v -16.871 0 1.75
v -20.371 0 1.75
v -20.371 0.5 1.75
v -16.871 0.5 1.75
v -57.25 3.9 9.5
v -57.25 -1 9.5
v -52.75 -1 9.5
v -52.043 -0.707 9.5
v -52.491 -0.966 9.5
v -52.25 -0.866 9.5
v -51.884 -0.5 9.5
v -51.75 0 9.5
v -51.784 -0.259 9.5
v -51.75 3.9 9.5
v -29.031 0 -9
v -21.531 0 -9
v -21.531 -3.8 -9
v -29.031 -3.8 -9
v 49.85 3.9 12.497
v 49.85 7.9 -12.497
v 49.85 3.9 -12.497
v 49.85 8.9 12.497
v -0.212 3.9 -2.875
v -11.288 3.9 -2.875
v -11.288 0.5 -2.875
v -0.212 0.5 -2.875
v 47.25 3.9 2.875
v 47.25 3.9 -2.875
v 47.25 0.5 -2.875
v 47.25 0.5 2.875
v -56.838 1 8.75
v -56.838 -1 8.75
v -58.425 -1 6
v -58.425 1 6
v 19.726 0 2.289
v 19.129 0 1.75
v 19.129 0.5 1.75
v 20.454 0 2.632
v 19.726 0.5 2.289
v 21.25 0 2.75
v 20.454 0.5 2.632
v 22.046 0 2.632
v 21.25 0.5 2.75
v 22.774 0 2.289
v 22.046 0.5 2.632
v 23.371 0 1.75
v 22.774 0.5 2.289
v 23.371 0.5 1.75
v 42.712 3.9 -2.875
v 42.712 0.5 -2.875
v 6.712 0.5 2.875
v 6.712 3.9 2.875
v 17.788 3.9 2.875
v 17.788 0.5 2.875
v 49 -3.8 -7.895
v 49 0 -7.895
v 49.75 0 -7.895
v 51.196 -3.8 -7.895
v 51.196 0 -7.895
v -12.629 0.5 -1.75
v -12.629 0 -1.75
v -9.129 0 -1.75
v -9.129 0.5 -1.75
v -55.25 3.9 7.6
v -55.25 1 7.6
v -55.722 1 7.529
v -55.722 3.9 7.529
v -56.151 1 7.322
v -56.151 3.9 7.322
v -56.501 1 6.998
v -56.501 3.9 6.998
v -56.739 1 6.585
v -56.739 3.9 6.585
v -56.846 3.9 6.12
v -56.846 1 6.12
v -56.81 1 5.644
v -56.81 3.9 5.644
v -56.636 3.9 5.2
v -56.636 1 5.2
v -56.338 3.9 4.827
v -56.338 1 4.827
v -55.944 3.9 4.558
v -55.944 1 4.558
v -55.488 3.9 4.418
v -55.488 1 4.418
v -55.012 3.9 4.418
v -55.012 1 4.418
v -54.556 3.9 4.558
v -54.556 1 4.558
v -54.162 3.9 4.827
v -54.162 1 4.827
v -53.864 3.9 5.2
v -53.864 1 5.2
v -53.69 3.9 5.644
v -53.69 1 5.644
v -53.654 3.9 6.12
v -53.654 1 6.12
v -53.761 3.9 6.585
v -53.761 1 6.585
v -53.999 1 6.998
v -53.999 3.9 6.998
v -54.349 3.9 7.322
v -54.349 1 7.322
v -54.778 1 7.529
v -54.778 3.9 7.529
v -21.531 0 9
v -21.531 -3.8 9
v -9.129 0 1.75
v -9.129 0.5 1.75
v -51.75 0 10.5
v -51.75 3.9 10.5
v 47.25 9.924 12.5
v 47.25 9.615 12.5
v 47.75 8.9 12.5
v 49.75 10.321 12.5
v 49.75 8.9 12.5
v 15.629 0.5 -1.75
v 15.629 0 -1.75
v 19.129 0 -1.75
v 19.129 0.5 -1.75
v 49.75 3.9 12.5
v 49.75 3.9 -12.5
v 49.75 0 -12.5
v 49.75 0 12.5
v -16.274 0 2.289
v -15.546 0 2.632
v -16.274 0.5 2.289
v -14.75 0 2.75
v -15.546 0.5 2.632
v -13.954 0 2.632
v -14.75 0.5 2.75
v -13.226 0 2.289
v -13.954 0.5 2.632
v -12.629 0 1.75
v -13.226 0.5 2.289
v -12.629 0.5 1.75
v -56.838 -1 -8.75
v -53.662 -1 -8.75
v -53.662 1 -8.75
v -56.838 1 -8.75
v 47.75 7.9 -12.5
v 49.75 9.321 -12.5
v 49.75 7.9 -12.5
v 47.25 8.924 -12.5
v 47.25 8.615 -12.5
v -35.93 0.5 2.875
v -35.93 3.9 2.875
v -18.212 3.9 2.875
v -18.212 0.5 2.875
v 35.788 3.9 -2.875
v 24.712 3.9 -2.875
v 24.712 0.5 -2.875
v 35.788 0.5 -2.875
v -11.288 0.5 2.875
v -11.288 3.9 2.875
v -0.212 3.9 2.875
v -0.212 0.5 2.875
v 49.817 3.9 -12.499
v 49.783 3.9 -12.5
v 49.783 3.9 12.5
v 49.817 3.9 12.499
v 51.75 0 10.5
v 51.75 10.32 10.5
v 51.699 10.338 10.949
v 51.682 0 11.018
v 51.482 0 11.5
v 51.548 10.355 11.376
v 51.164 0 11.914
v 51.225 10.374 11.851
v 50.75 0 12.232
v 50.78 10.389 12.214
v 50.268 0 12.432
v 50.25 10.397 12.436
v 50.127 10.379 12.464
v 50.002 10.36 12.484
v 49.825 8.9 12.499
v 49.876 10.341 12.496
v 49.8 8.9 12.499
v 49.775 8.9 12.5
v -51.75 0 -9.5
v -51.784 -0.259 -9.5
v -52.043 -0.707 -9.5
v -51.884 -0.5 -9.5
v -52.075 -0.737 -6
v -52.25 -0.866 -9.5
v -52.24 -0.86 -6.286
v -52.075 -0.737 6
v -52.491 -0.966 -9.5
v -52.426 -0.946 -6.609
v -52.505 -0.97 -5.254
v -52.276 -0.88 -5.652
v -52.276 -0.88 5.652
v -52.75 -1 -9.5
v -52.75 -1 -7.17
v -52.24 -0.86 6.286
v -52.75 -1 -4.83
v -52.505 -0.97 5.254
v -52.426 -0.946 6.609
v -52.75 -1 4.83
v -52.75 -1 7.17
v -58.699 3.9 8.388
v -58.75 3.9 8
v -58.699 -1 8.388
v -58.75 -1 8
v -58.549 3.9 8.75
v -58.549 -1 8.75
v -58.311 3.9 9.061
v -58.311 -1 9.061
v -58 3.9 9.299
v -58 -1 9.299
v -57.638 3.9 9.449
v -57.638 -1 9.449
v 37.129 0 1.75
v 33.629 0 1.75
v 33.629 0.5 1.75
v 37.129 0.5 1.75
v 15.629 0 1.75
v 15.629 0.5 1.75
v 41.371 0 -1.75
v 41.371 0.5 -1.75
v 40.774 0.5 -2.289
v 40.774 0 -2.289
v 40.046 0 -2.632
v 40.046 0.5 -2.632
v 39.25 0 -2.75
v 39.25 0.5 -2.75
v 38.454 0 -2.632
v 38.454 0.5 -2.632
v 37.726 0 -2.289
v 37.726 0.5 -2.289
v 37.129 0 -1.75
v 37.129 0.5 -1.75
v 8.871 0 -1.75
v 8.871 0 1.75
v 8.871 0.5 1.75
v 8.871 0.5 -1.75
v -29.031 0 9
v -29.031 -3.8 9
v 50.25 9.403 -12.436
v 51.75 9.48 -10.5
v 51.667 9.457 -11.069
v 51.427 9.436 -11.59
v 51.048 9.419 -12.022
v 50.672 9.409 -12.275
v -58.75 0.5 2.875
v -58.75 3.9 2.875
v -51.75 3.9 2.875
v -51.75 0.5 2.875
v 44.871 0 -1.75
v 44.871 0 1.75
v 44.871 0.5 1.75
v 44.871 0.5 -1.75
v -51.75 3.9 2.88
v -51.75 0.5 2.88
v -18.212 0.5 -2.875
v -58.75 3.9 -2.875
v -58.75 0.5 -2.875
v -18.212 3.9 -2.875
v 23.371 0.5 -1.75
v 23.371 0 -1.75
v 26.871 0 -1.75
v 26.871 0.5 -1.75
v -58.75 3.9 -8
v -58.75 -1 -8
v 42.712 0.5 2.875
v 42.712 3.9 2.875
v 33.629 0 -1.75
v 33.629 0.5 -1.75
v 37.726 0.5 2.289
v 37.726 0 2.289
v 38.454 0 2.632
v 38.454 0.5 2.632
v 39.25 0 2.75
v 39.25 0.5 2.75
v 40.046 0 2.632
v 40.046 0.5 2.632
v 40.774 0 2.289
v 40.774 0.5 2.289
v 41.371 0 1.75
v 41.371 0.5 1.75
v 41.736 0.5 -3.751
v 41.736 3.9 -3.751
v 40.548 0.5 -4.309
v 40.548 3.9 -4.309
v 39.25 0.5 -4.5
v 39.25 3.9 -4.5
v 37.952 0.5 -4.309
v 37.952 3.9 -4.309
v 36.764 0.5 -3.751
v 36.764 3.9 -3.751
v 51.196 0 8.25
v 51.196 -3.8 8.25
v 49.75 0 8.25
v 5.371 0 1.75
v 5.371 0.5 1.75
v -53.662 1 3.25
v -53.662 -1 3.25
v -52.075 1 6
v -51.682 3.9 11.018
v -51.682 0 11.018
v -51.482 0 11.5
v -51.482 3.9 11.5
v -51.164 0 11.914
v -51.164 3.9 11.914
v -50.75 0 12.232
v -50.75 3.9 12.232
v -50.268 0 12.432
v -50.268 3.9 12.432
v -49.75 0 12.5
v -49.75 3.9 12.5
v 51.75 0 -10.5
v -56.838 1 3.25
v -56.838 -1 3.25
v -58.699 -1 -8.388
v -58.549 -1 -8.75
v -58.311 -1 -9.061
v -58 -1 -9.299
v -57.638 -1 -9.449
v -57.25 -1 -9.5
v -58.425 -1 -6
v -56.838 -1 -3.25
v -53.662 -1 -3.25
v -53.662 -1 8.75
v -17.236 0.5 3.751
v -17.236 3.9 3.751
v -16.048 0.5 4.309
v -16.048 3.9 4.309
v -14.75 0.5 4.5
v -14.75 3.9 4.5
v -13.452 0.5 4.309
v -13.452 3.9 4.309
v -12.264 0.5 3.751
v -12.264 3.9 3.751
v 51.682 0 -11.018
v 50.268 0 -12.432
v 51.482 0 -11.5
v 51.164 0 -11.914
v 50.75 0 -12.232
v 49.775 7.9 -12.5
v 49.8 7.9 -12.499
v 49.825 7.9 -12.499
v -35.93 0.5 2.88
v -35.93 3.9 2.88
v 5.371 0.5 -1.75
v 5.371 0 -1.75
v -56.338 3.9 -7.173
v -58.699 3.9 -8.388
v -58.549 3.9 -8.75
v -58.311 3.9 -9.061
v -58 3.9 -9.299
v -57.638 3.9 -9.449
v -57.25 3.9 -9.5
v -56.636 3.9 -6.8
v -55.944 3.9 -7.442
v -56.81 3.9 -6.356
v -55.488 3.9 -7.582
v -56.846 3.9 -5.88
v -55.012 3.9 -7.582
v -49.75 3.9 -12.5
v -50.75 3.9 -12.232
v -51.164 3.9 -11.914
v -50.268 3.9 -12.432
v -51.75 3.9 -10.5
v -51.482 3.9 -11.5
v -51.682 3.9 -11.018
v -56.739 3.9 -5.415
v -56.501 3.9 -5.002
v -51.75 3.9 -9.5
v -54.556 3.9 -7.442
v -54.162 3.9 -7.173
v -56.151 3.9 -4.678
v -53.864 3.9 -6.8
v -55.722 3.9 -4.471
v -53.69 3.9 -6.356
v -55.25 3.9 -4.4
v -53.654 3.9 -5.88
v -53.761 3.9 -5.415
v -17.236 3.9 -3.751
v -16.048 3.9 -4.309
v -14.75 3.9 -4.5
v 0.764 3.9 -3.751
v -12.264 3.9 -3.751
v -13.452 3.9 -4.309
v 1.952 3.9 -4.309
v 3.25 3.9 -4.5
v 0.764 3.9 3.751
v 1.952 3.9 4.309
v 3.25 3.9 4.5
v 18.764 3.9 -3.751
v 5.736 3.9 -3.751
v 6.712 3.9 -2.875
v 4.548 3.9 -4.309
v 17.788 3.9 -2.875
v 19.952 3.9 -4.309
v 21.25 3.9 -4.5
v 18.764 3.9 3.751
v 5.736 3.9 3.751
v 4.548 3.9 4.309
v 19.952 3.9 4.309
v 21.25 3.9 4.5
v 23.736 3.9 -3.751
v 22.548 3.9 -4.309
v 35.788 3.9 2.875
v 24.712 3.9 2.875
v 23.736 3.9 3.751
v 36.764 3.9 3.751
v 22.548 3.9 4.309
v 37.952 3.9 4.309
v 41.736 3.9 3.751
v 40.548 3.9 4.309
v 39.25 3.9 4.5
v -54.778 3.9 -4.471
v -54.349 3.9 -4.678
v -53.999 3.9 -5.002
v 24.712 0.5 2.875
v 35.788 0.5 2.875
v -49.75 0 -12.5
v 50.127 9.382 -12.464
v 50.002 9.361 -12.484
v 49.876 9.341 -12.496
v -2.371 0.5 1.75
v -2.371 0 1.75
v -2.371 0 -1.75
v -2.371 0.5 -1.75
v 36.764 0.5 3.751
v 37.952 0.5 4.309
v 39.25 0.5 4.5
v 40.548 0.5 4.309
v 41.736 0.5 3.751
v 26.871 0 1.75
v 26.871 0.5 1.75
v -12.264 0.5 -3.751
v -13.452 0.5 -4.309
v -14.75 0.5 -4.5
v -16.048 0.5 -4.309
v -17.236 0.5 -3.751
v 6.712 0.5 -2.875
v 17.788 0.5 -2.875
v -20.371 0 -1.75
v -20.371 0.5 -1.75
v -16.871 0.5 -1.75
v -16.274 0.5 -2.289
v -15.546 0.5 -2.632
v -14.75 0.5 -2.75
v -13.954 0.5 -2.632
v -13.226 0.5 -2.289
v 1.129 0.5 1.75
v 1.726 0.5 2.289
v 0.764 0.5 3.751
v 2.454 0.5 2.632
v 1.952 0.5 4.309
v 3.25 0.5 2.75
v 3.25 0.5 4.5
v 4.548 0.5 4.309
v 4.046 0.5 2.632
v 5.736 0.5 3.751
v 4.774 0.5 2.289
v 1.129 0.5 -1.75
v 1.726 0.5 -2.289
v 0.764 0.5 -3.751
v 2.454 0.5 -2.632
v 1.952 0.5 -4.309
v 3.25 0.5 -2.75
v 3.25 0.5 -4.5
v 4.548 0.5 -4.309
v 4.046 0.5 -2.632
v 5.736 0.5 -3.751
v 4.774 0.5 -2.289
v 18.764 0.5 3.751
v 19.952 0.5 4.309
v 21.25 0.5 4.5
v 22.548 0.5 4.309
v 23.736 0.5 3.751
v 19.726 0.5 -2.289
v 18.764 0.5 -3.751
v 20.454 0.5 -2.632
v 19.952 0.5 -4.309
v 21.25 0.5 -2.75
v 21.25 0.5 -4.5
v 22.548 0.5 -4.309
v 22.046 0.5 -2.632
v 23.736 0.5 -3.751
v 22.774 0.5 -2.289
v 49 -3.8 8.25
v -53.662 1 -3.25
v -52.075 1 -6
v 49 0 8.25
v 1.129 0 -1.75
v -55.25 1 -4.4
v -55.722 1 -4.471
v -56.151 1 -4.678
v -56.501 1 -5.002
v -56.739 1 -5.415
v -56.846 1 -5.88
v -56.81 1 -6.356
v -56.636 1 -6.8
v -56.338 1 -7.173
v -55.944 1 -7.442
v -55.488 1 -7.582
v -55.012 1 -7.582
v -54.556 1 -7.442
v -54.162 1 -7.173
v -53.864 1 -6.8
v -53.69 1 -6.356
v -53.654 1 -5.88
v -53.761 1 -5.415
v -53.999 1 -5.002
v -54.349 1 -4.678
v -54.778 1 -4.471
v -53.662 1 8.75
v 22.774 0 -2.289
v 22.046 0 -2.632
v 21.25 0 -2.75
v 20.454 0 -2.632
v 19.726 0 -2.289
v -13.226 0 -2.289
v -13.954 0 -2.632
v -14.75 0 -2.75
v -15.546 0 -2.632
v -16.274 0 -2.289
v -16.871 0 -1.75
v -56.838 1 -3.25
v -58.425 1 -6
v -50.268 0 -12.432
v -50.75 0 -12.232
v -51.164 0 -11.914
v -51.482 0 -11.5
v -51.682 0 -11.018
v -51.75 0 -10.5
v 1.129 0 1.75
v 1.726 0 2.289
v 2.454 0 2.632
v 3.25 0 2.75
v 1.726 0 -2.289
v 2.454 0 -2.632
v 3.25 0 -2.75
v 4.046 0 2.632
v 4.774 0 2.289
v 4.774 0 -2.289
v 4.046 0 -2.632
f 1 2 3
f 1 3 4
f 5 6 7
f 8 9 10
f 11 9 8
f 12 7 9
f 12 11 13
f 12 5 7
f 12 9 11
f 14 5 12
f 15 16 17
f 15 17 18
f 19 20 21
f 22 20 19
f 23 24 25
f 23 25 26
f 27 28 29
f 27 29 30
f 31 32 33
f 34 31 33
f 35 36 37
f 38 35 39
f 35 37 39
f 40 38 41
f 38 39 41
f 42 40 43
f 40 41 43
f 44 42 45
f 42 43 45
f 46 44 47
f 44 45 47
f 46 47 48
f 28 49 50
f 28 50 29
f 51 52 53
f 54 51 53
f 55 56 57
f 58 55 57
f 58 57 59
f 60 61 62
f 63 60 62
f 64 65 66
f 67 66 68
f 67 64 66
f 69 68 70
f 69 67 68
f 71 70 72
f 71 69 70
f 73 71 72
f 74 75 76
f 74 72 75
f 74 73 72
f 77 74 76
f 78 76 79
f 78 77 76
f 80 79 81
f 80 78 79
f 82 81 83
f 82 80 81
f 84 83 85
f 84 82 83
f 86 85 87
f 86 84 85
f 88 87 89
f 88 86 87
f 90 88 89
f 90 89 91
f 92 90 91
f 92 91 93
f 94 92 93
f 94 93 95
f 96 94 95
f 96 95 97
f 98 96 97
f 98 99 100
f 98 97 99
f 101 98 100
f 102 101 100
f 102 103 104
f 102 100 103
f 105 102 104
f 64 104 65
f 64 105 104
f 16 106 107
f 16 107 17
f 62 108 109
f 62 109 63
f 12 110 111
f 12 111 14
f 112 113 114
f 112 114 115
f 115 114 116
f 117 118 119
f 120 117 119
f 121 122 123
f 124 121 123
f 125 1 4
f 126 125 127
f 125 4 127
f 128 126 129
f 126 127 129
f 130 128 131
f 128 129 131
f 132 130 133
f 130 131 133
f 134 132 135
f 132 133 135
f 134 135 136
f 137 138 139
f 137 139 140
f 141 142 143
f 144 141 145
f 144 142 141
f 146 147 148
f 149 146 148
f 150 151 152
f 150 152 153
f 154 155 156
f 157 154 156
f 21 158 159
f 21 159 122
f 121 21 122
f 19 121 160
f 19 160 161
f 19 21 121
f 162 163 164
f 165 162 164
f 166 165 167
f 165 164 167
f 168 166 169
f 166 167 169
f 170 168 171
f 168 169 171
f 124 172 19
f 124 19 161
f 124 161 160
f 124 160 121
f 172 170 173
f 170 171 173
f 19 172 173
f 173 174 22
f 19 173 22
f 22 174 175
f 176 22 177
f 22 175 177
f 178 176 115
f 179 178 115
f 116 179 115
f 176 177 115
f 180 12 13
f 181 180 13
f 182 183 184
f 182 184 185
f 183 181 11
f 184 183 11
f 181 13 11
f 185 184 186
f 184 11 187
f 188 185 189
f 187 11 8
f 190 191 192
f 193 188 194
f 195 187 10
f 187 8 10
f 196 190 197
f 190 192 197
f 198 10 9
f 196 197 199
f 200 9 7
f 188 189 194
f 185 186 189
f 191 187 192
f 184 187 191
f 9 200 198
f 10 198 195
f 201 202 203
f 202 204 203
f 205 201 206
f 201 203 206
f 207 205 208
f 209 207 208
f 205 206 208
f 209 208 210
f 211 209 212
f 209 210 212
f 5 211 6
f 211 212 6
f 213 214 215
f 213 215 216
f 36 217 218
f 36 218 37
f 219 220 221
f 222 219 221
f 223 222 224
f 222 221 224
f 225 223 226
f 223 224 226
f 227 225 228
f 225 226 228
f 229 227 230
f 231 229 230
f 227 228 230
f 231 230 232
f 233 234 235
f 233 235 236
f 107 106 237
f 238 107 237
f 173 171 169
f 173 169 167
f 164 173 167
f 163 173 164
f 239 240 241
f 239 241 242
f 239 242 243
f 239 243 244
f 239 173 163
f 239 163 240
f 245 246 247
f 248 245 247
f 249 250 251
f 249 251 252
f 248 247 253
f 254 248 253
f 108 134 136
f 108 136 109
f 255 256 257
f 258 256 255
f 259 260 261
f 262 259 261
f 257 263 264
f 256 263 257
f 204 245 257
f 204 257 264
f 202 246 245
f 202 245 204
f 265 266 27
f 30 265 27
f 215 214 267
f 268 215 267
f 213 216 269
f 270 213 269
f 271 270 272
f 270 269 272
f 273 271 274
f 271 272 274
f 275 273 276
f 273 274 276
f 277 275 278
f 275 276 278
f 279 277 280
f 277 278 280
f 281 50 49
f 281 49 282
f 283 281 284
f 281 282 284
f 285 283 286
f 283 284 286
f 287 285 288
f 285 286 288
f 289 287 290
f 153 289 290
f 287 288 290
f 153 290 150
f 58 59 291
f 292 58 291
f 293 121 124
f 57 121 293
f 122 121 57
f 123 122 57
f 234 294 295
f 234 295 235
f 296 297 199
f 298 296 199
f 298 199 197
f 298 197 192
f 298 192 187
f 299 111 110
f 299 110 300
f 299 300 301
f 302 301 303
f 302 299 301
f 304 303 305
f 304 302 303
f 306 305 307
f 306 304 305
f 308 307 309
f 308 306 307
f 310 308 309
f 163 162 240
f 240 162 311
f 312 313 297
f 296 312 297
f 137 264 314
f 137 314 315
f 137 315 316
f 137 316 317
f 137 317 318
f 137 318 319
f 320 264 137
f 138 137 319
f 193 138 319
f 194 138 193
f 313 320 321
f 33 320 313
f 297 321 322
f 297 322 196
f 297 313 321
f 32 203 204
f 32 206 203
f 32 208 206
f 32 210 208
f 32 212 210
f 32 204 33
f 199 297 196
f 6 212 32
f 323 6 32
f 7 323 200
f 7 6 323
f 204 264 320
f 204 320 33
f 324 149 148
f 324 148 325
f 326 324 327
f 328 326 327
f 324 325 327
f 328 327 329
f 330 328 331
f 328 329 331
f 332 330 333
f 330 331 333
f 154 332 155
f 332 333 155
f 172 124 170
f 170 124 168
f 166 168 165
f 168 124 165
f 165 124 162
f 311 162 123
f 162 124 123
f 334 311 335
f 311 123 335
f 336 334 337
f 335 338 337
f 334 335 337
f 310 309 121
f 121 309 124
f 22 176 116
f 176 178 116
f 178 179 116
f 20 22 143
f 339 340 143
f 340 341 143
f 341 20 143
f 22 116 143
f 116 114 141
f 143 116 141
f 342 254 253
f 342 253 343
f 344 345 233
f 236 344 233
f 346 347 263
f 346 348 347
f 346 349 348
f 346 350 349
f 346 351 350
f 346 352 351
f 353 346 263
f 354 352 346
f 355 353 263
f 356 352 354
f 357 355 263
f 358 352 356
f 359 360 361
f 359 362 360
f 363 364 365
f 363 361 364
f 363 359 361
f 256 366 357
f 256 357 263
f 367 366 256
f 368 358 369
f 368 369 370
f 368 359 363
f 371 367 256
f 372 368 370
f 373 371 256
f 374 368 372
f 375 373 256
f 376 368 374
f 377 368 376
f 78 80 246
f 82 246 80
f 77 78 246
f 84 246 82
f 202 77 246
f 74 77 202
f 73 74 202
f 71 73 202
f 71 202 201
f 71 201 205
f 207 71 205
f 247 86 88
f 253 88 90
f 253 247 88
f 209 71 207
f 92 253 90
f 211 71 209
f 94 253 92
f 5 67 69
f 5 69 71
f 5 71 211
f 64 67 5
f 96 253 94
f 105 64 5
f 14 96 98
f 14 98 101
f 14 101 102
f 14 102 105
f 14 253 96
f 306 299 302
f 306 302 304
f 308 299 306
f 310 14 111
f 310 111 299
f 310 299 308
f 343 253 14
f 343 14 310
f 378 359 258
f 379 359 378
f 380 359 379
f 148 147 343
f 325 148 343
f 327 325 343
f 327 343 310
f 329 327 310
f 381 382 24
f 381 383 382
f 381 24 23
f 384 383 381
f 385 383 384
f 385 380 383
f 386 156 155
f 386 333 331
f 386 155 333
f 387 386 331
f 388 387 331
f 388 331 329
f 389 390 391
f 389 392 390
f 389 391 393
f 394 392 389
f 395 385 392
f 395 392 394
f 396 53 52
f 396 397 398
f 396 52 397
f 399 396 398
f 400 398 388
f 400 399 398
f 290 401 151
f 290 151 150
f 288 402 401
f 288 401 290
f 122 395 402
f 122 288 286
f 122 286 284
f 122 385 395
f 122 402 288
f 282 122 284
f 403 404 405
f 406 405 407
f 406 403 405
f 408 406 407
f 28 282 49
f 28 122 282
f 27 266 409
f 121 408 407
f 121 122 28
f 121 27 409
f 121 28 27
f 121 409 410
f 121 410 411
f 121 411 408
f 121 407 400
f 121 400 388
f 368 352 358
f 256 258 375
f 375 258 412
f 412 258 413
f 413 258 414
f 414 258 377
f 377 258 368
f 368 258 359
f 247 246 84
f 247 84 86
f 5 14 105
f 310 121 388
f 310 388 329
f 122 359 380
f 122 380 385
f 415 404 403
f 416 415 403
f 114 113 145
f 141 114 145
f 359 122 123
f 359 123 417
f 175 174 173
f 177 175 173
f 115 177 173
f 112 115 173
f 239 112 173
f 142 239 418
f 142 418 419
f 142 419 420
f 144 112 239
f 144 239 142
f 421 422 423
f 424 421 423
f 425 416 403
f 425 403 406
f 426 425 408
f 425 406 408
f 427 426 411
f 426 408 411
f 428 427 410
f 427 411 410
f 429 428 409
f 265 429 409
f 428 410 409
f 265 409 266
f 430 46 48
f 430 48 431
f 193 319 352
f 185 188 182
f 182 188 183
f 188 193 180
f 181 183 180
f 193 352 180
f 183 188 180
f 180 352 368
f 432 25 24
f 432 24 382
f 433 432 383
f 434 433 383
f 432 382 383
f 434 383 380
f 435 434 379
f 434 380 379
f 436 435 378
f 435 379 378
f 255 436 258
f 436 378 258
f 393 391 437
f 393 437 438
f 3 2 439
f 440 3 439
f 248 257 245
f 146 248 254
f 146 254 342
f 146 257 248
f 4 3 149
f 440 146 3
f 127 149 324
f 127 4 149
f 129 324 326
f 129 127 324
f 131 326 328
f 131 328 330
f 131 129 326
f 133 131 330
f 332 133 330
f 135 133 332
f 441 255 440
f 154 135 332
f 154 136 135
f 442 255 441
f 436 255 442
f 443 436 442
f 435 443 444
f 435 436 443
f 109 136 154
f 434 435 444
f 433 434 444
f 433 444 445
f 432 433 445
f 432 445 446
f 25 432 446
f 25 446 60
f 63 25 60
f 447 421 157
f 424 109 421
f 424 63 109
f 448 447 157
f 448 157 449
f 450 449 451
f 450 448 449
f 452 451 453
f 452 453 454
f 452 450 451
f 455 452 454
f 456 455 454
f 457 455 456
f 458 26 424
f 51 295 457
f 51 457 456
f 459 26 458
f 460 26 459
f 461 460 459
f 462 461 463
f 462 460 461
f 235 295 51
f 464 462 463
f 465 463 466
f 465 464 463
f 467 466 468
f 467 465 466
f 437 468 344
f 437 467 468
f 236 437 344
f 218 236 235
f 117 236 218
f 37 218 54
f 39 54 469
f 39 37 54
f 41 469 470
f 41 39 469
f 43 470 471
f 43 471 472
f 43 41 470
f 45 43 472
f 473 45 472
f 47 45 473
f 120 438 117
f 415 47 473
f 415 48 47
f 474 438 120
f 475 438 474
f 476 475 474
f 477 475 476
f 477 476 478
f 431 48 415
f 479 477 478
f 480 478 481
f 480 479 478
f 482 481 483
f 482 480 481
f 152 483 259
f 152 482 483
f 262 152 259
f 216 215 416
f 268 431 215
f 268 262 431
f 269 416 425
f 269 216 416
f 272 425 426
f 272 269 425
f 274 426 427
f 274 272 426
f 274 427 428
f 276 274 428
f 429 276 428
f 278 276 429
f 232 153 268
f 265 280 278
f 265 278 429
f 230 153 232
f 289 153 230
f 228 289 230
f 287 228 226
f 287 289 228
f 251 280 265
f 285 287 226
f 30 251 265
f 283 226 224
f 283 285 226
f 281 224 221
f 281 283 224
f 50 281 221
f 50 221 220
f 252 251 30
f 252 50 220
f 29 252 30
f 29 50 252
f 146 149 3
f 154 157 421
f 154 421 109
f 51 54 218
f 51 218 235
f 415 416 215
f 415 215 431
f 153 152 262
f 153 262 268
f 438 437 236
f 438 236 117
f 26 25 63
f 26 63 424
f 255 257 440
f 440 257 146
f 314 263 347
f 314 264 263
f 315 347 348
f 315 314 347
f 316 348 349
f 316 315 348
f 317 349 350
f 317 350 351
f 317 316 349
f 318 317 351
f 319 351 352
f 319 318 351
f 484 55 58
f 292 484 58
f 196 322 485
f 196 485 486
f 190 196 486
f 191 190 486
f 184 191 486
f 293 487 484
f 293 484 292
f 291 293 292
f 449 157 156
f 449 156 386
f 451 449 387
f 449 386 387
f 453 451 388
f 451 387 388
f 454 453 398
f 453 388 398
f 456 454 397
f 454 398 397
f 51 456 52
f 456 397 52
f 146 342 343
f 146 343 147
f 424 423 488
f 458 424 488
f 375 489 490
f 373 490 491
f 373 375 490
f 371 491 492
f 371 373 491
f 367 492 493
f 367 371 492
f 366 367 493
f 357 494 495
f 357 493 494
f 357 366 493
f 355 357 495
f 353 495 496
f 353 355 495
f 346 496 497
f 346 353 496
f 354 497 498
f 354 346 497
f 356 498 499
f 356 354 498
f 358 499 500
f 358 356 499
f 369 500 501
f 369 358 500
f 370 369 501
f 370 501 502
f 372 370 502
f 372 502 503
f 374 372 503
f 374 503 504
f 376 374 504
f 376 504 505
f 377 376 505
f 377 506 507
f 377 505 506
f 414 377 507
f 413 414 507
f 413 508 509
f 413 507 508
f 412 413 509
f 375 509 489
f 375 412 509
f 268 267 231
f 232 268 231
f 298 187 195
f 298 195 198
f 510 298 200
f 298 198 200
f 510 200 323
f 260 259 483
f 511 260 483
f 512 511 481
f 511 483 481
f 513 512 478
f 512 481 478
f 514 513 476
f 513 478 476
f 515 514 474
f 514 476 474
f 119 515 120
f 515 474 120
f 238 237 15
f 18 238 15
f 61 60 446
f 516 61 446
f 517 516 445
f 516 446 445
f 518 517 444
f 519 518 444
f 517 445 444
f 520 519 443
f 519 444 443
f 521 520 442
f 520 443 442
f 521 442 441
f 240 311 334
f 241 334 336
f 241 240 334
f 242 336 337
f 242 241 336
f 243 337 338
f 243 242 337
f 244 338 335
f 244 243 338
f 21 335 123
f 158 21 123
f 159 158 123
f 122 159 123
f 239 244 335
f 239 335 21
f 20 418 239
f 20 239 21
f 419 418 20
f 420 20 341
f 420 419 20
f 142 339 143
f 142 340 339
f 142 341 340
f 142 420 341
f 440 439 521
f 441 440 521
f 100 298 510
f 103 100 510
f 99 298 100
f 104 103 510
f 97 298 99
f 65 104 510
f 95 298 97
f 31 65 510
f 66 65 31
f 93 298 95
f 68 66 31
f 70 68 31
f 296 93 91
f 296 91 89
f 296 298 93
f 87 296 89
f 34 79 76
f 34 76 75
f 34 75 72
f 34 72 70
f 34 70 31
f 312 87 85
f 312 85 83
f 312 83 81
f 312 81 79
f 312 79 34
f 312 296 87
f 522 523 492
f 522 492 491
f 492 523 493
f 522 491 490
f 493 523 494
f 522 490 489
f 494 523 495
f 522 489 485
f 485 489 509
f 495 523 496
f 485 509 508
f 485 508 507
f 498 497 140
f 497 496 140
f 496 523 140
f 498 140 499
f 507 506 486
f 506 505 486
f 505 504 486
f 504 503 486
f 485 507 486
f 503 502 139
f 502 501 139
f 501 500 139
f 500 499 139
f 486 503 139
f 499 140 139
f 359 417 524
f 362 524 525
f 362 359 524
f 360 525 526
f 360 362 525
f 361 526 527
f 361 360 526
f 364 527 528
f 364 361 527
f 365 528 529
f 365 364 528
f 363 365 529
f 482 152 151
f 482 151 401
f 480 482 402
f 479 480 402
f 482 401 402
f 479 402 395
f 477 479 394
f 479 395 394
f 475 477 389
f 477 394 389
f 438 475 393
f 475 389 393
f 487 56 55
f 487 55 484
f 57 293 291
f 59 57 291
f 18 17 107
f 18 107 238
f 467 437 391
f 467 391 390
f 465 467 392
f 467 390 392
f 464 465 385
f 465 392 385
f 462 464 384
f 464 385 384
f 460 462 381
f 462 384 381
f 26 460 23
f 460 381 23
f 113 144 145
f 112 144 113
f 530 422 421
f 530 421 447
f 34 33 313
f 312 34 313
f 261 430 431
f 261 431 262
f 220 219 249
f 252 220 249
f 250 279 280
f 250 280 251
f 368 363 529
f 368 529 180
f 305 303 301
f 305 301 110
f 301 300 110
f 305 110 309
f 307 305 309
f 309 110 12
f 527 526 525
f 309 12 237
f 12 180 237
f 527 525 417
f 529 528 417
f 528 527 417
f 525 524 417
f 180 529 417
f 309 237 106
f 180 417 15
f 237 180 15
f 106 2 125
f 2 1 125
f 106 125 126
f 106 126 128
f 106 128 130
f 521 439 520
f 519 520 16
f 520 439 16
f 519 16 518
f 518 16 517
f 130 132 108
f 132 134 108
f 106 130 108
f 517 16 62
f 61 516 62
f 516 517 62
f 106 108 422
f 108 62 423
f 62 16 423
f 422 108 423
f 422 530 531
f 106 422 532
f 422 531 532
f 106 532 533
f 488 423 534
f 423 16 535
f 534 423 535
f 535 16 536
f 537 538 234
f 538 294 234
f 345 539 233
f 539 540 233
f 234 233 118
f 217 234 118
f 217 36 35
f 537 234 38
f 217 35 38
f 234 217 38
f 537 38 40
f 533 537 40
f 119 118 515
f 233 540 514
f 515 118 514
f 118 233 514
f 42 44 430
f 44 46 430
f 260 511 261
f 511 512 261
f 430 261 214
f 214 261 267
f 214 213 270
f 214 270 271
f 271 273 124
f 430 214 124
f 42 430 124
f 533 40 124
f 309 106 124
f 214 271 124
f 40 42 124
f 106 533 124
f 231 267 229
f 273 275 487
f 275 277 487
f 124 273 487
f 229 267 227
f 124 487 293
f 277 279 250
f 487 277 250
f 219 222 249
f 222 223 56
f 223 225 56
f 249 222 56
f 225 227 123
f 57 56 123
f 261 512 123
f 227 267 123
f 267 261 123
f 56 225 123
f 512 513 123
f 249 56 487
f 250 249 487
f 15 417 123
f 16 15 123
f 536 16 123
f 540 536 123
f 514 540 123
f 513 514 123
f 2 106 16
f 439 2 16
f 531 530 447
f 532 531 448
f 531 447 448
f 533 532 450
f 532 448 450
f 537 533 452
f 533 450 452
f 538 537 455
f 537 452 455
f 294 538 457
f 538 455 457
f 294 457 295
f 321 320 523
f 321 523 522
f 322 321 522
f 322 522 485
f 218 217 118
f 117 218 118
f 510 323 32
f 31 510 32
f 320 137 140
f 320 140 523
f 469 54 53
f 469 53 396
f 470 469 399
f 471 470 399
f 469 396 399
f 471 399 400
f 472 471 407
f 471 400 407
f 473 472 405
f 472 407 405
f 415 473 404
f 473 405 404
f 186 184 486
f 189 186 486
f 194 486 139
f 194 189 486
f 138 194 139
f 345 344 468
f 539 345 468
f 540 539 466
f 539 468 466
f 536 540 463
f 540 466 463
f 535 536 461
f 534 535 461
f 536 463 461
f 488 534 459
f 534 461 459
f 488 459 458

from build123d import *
from OCP.BRepFilletAPI import BRepFilletAPI_MakeChamfer

# Parameters (mm, degrees)
SKETCH1_W                = 99.5
SKETCH1_H                = 25
BOSS_EXTRUDE1_DEPTH      = 3.9
SKETCH2_R                = 2.75
CUT_EXTRUDE1_DEPTH       = 52.444363151
SKETCH4_W                = 2
SKETCH4_H                = 25
BOSS_EXTRUDE2_DEPTH      = 3.9
SNAP_START               = -51.12804878
SNAP_HOOK1_DEPTH         = 1.37804878
SNAP_START_2             = -10.052407779
SNAP_HOOK1_2_DEPTH       = 20.104815558
SNAP_START_3             = -10.267279674
SNAP_HOOK1_3_DEPTH       = 20.534559348
SNAP_START_4             = -53
SNAP_HOOK1_4_DEPTH       = 5
CUT_EXTRUDE2_DEPTH       = 3.4
SKETCH6_W                = 131.446270808
SKETCH6_H                = 5.75
CUT_EXTRUDE3_DEPTH       = 3.4
FILLET3_R                = 2
SKETCH12_W               = 3.5
SKETCH12_H               = 3.5
CUT_EXTRUDE8_DEPTH       = 3.9
SKETCH13_W               = 19.63116991
SKETCH13_H               = 5.75
CUT_EXTRUDE9_DEPTH       = 10
BOSS_EXTRUDE8_DEPTH      = 1
BOSS_EXTRUDE8_DEPTH_BACK = 3.9
SKETCH15_W               = 7
SKETCH15_H               = 19
SKETCH15_R               = 1.6
CUT_EXTRUDE10_DEPTH      = 2
SKETCH17_W               = 7.226910769
SKETCH17_H               = 5.75
CUT_EXTRUDE11_DEPTH      = 3.4
FILLET6_R                = 1.5
SKETCH18_W               = 7.5
SKETCH18_H               = 18
BOSS_EXTRUDE9_DEPTH      = 3.8
SKETCH21_W               = 7.5
SKETCH21_H               = 16.5
SKETCH21_W_2             = 2.196133812
SKETCH21_H_2             = 16.144777587
BOSS_EXTRUDE11_DEPTH     = 3.8
FILLET7_R                = 1
SKETCH22_W               = 5.52852217
SKETCH22_H               = 24.476704992
SKETCH22_W_2             = 17.032273736
SKETCH22_H_2             = 39.798184175
CUT_EXTRUDE14_DEPTH      = 5.1
BOSS_EXTRUDE12_START     = 9.9
BOSS_EXTRUDE12_DEPTH     = 9.9
CUT_EXTRUDE15_DEPTH      = 2.6
CUT_EXTRUDE16_DEPTH      = 105.769556647
CHAMFER1_SIZE            = 3
CHAMFER1_SIZE2           = 0.475153321
CHAMFER2_SIZE            = 0.5
CHAMFER2_SIZE2           = 0.714074003
SKETCH28_W               = 5.417071425
SKETCH28_H               = 25.110658167
CUT_EXTRUDE18_DEPTH      = 61.55660575
SPLIT1_SURFACE_1_BACK    = 115.179
SPLIT1_SURFACE_1_DEPTH   = 230.358
SPLIT1_SURFACE_2_BACK    = 115.179
SPLIT1_SURFACE_2_DEPTH   = 230.358


with BuildPart() as part:
    # Sketch1 → Boss-Extrude1 (new body)
    with BuildSketch(Plane(origin=(0, 0, 0), x_dir=(1, 0, 0), z_dir=(0, 1, 0))):
        Rectangle(SKETCH1_W, SKETCH1_H)
    extrude(amount=BOSS_EXTRUDE1_DEPTH)

    # Sketch2 → Cut-Extrude1 (cut, through all)
    with BuildSketch(Plane(origin=(0, 3.9, 0), x_dir=(1, 0, 0), z_dir=(0, 1, 0))):
        with Locations(Location((-14.75, 0, 0), (0, 0, 270))):
            Circle(SKETCH2_R)
        with Locations(Location((3.25, 0, 0), (0, 0, 270))):
            Circle(SKETCH2_R)
        with Locations(Location((21.25, 0, 0), (0, 0, 270))):
            Circle(SKETCH2_R)
        with Locations(Location((39.25, 0, 0), (0, 0, 270))):
            Circle(SKETCH2_R)
    extrude(amount=-CUT_EXTRUDE1_DEPTH, mode=Mode.SUBTRACT)

    # Sketch4 → Boss-Extrude2 (add)
    with BuildSketch(Plane(origin=(0, 0, 0), x_dir=(1, 0, 0), z_dir=(0, 1, 0))):
        with Locations((-50.75, 0)):
            Rectangle(SKETCH4_W, SKETCH4_H)
        with Locations((50.75, 0)):
            Rectangle(SKETCH4_W, SKETCH4_H)
    extrude(amount=BOSS_EXTRUDE2_DEPTH)

    # Snap Hook1: read off the stored shape, not the designer's step
    # Snap Hook1 outline → Snap Hook1 (add)
    with BuildSketch(Plane.YZ.offset(SNAP_START)):
        Polygon((9, -10), (9, 10), (3.9, 10.267279674), (3.9, -10.267279674), align=None)
    snap_hook1 = extrude(amount=SNAP_HOOK1_DEPTH)

    # Snap Hook1 2 outline → Snap Hook1 2 (add)
    with BuildSketch(Plane.XY.offset(SNAP_START_2)):
        Polygon((-51.12804878, 3.9), (-51.12804878, 9), (-51.75, 3.9), align=None)
        Polygon((-49.75, 9), (-49.75, 8), (-48.75, 8), (-48.75, 8.5), align=None)
    snap_hook1_2 = extrude(amount=SNAP_HOOK1_2_DEPTH)

    # Snap Hook1 3 outline → Snap Hook1 3 (add)
    with BuildSketch(Plane.XY.offset(SNAP_START_3)):
        Polygon((-51.12804878, 3.9), (-51.12804878, 9), (-51.75, 3.9), align=None)
    snap_hook1_3 = extrude(amount=SNAP_HOOK1_3_DEPTH)

    # Snap Hook1 4 outline → Snap Hook1 4 (cut)
    with BuildSketch(Plane.YZ.offset(SNAP_START_4)):
        Polygon((9, 10), (10, 9.947592221), (10, 10.267279674), (3.9, 10.267279674), align=None)
        Polygon((10, -9.947592221), (9, -10), (3.9, -10.267279674), (10, -10.267279674), align=None)
    snap_hook1_4 = extrude(amount=SNAP_HOOK1_4_DEPTH, mode=Mode.SUBTRACT)

    # Mirror1: Snap Hook1, Snap Hook1 2, Snap Hook1 3, Snap Hook1 4 across plane
    add(snap_hook1.mirror(Plane(origin=(0, 0, 0), x_dir=(0, 0, 1), z_dir=(1, 0, 0))))
    add(snap_hook1_2.mirror(Plane(origin=(0, 0, 0), x_dir=(0, 0, 1), z_dir=(1, 0, 0))))
    add(snap_hook1_3.mirror(Plane(origin=(0, 0, 0), x_dir=(0, 0, 1), z_dir=(1, 0, 0))))
    add(snap_hook1_4.mirror(Plane(origin=(0, 0, 0), x_dir=(0, 0, 1), z_dir=(1, 0, 0))), mode=Mode.SUBTRACT)

    # Sketch5 → Cut-Extrude2 (cut)
    with BuildSketch(Plane(origin=(0, 3.9, 0), x_dir=(1, 0, 0), z_dir=(0, 1, 0))):
        with BuildLine():
            Line((-18.75, 2.061552813), (-18.75, -2.061552813))
            ThreePointArc((-18.75, -2.061552813), (-14.75, -4.5), (-10.75, -2.061552813))
            Line((-10.75, -2.061552813), (-10.75, 2.061552813))
            ThreePointArc((-10.75, 2.061552813), (-14.75, 4.5), (-18.75, 2.061552813))
        make_face()
        with BuildLine():
            Line((-0.75, 2.061552813), (-0.75, -2.061552813))
            ThreePointArc((-0.75, -2.061552813), (3.25, -4.5), (7.25, -2.061552813))
            Line((7.25, -2.061552813), (7.25, 2.061552813))
            ThreePointArc((7.25, 2.061552813), (3.25, 4.5), (-0.75, 2.061552813))
        make_face()
        with BuildLine():
            Line((17.25, 2.061552813), (17.25, -2.061552813))
            ThreePointArc((17.25, -2.061552813), (21.25, -4.5), (25.25, -2.061552813))
            Line((25.25, -2.061552813), (25.25, 2.061552813))
            ThreePointArc((25.25, 2.061552813), (21.25, 4.5), (17.25, 2.061552813))
        make_face()
        with BuildLine():
            Line((35.25, 2.061552813), (35.25, -2.061552813))
            ThreePointArc((35.25, -2.061552813), (39.25, -4.5), (43.25, -2.061552813))
            Line((43.25, -2.061552813), (43.25, 2.061552813))
            ThreePointArc((43.25, 2.061552813), (39.25, 4.5), (35.25, 2.061552813))
        make_face()
    extrude(amount=-CUT_EXTRUDE2_DEPTH, mode=Mode.SUBTRACT)

    # Sketch6 → Cut-Extrude3 (cut)
    with BuildSketch(Plane(origin=(0, 3.9, 0), x_dir=(1, 0, 0), z_dir=(0, 1, 0))):
        with Locations((3.25, 0)):
            Rectangle(SKETCH6_W, SKETCH6_H)
    extrude(amount=-CUT_EXTRUDE3_DEPTH, mode=Mode.SUBTRACT)

    # Fillet3
    fillet3_edges = [part.edges().sort_by_distance(p)[0] for p in [
        (-51.75, 1.95, -12.5),
        (-51.75, 1.95, 12.5),
        (51.75, 1.95, 12.5),
        (51.75, 1.95, -12.5),
    ]]
    fillet(fillet3_edges, radius=FILLET3_R)

    # Sketch12 → Cut-Extrude8 (cut)
    with BuildSketch(Plane(origin=(0, 0, 0), x_dir=(1, 0, 0), z_dir=(0, 1, 0))):
        with Locations((-10.878679656, 0)):
            Rectangle(SKETCH12_W, SKETCH12_H)
        with Locations((-18.621320344, 0)):
            Rectangle(SKETCH12_W, SKETCH12_H)
        with Locations((7.121320344, 0)):
            Rectangle(SKETCH12_W, SKETCH12_H)
        with Locations((-0.621320344, 0)):
            Rectangle(SKETCH12_W, SKETCH12_H)
        with Locations((25.121320344, 0)):
            Rectangle(SKETCH12_W, SKETCH12_H)
        with Locations((17.378679656, 0)):
            Rectangle(SKETCH12_W, SKETCH12_H)
        with Locations((43.121320344, 0)):
            Rectangle(SKETCH12_W, SKETCH12_H)
        with Locations((35.378679656, 0)):
            Rectangle(SKETCH12_W, SKETCH12_H)
    extrude(amount=CUT_EXTRUDE8_DEPTH, mode=Mode.SUBTRACT)

    # Sketch13 → Cut-Extrude9 (cut)
    with BuildSketch(Plane(origin=(0, 0.5, 0), x_dir=(1, 0, 0), z_dir=(0, 1, 0))):
        with Locations((-45.74538215, -0.005)):
            Rectangle(SKETCH13_W, SKETCH13_H)
    extrude(amount=CUT_EXTRUDE9_DEPTH, mode=Mode.SUBTRACT)

    # Sketch18 → Boss-Extrude9 (add)
    with BuildSketch(Plane(origin=(0, 0, 0), x_dir=(-1, 0, 0), z_dir=(0, -1, 0))):
        with Locations((25.281035949, 0)):
            Rectangle(SKETCH18_W, SKETCH18_H)
    extrude(amount=BOSS_EXTRUDE9_DEPTH)

    # Sketch21 → Boss-Extrude11 (add)
    with BuildSketch(Plane.XZ):
        with Locations((-25.281035949, 0)):
            Rectangle(SKETCH21_W, SKETCH21_H)
        with Locations((50.098066906, 0.177611206)):
            Rectangle(SKETCH21_W_2, SKETCH21_H_2)
    extrude(amount=BOSS_EXTRUDE11_DEPTH)

    # Sketch22 → Cut-Extrude14 (cut)
    with BuildSketch(Plane(origin=(0, 3.9, 0), x_dir=(1, 0, 0), z_dir=(0, 1, 0))):
        with Locations((-50.419989223, -0.434704532)):
            Rectangle(SKETCH22_W, SKETCH22_H)
        with Locations((49.214622504, 0.682711118)):
            Rectangle(SKETCH22_W_2, SKETCH22_H_2)
    extrude(amount=CUT_EXTRUDE14_DEPTH, mode=Mode.SUBTRACT)



with BuildPart() as body_2:
    # Sketch15 → Boss-Extrude8 (new, two sides: drawn at the far end of the back side and taken through both)
    with BuildSketch(Plane.XZ.offset(-BOSS_EXTRUDE8_DEPTH_BACK)):
        with Locations((-55.25, 0)):
            Rectangle(SKETCH15_W, SKETCH15_H)
        with Locations(Location((-55.25, -6, 0), (0, 0, 90))):
            Circle(SKETCH15_R, mode=Mode.SUBTRACT)
        with Locations(Location((-55.25, 6, 0), (0, 0, 90))):
            Circle(SKETCH15_R, mode=Mode.SUBTRACT)
    extrude(amount=BOSS_EXTRUDE8_DEPTH + BOSS_EXTRUDE8_DEPTH_BACK)

    # Sketch16 → Cut-Extrude10 (cut)
    with BuildSketch(Plane(origin=(0, -1, 0), x_dir=(-1, 0, 0), z_dir=(0, -1, 0))):
        Polygon((56.83771324, -8.75), (58.425426481, -6), (56.83771324, -3.25), (53.66228676, -3.25), (52.074573519, -6), (53.66228676, -8.75), align=None)
        Polygon((53.66228676, 8.75), (56.83771324, 8.75), (58.425426481, 6), (56.83771324, 3.25), (53.66228676, 3.25), (52.074573519, 6), align=None)
    extrude(amount=-CUT_EXTRUDE10_DEPTH, mode=Mode.SUBTRACT)

    # Sketch17 → Cut-Extrude11 (cut)
    with BuildSketch(Plane(origin=(0, 3.9, 0), x_dir=(1, 0, 0), z_dir=(0, 1, 0))):
        with Locations((-55.363455384, 0)):
            Rectangle(SKETCH17_W, SKETCH17_H)
    extrude(amount=-CUT_EXTRUDE11_DEPTH, mode=Mode.SUBTRACT)

    # Fillet6
    fillet6_edges = [body_2.edges().sort_by_distance(p)[0] for p in [
        (-58.75, 1.45, -9.5),
        (-58.75, 1.45, 9.5),
    ]]
    fillet(fillet6_edges, radius=FILLET6_R)

    # Fillet7
    # the kernel refuses this fillet: 1 mm, written as the material it takes off along each edge
    with BuildSketch(Plane(origin=(-51.75, -1, 12), x_dir=(-1, 0, 0), z_dir=(0, 0, -1))) as fillet7_piece_1:
        with BuildLine():
            CenterArc((FILLET7_R, FILLET7_R), FILLET7_R, 180, 90)
            Line((0, FILLET7_R), (0, 0))
            Line((0, 0), (FILLET7_R, 0))
        make_face()
    extrude(amount=24, mode=Mode.SUBTRACT)


with BuildPart() as part_1:
    add(part.part)

    add(body_2.part)  # Boss-Extrude12 merges body 2
    # Sketch23 → Boss-Extrude12 (add)
    with BuildSketch(Plane(origin=(0, 0.5, 0), x_dir=(1, 0, 0), z_dir=(0, 1, 0)).offset(BOSS_EXTRUDE12_START)):
        with BuildLine():
            Line((-47.25, 12.5), (-49.75, 12.5))
            ThreePointArc((-49.75, 12.5), (-51.164213562, 11.914213562), (-51.75, 10.5))
            Line((-51.75, 10.5), (-51.75, 3.546980625))
            Line((-51.75, 3.546980625), (-47.25, 3.546980625))
            Line((-47.25, 3.546980625), (-47.25, 12.5))
        make_face()
        with BuildLine():
            Line((-51.75, -10.5), (-51.75, -3.546980625))
            Line((-51.75, -3.546980625), (-47.25, -3.546980625))
            Line((-47.25, -3.546980625), (-47.25, -12.5))
            Line((-47.25, -12.5), (-49.75, -12.5))
            ThreePointArc((-49.75, -12.5), (-51.164213562, -11.914213562), (-51.75, -10.5))
        make_face()
        with BuildLine():
            Line((47.25, -12.5), (49.75, -12.5))
            ThreePointArc((49.75, -12.5), (51.164213562, -11.914213562), (51.75, -10.5))
            Line((51.75, -10.5), (51.75, -3.546980625))
            Line((51.75, -3.546980625), (51.75, 3.546980625))
            Line((51.75, 3.546980625), (51.75, 10.5))
            ThreePointArc((51.75, 10.5), (51.164213562, 11.914213562), (49.75, 12.5))
            Line((49.75, 12.5), (47.25, 12.5))
            Line((47.25, 12.5), (47.25, 3.546980625))
            Line((47.25, 3.546980625), (47.25, -3.546980625))
            Line((47.25, -3.546980625), (47.25, -12.5))
        make_face()
    extrude(amount=-BOSS_EXTRUDE12_DEPTH)

    # Sketch24 → Cut-Extrude15 (cut)
    with BuildSketch(Plane(origin=(-47.25, 0, 0), x_dir=(0, 0, -1), z_dir=(1, 0, 0))):
        Polygon((12.5, 3.9), (-12.5, 3.9), (-12.5, 8.9), (12.5, 7.9), align=None)
    cut_extrude15 = extrude(amount=-CUT_EXTRUDE15_DEPTH, mode=Mode.SUBTRACT)

    # Mirror2: Cut-Extrude15 across plane
    add(cut_extrude15.mirror(Plane(origin=(0, 0, 0), x_dir=(0, 0, 1), z_dir=(1, 0, 0))), mode=Mode.SUBTRACT)

    # Sketch25 → Cut-Extrude16 (cut, through all)
    with BuildSketch(Plane.ZY.offset(51.75)):
        Polygon((12.5, 10.4), (-15.116009289, 9.295359628), (-15.116009289, 13.641996299), (12.5, 13.641996299), align=None)
    extrude(amount=-CUT_EXTRUDE16_DEPTH, mode=Mode.SUBTRACT)

    # Chamfer1: one chamfer whose edges measure the first distance from different faces: ONE call of the kernel's chamfer builder (chamfer() names one face for all edges)
    chamfer1_edges_1 = [part_1.edges().sort_by_distance(p)[0] for p in [
        (47.25, 9.9, 0),
    ]]
    chamfer1_side_1 = [part_1.faces().sort_by_distance(p)[0] for p in [
        (49.472054691, 9.9, 0),
    ]]
    chamfer1_edges_2 = [part_1.edges().sort_by_distance(p)[0] for p in [
        (-47.25, 9.579060387, -8.023490313),
    ]]
    chamfer1_side_2 = [part_1.faces().sort_by_distance(p)[0] for p in [
        (-49.460742376, 9.582569565, -7.935760876),
    ]]
    chamfer1_edges_3 = [part_1.edges().sort_by_distance(p)[0] for p in [
        (-47.25, 10.220939613, 8.023490313),
    ]]
    chamfer1_side_3 = [part_1.faces().sort_by_distance(p)[0] for p in [
        (-49.460742376, 10.217430435, 7.935760876),
    ]]
    chamfer1 = BRepFilletAPI_MakeChamfer(part_1.part.solid().wrapped)
    for e in chamfer1_edges_1:
        chamfer1.Add(CHAMFER1_SIZE, CHAMFER1_SIZE2, e.wrapped, chamfer1_side_1[0].wrapped)  # the first distance lies on this face
    for e in chamfer1_edges_2:
        chamfer1.Add(CHAMFER1_SIZE, CHAMFER1_SIZE2, e.wrapped, chamfer1_side_2[0].wrapped)  # the first distance lies on this face
    for e in chamfer1_edges_3:
        chamfer1.Add(CHAMFER1_SIZE, CHAMFER1_SIZE2, e.wrapped, chamfer1_side_3[0].wrapped)  # the first distance lies on this face
    add(Compound.cast(chamfer1.Shape()), mode=Mode.REPLACE)

    # Chamfer2: one chamfer whose edges measure the first distance from different faces: ONE call of the kernel's chamfer builder (chamfer() names one face for all edges)
    chamfer2_edges_1 = [part_1.edges().sort_by_distance(p)[0] for p in [
        (-47.25, 8.079060387, -8.023490313),
    ]]
    chamfer2_side_1 = [part_1.faces().sort_by_distance(p)[0] for p in [
        (-47.25, 8.591293742, -8.023490313),
    ]]
    chamfer2_edges_2 = [part_1.edges().sort_by_distance(p)[0] for p in [
        (-47.25, 8.720939613, 8.023490313),
    ]]
    chamfer2_side_2 = [part_1.faces().sort_by_distance(p)[0] for p in [
        (-47.25, 9.233172967, 8.023490313),
    ]]
    chamfer2_edges_3 = [part_1.edges().sort_by_distance(p)[0] for p in [
        (47.25, 8.4, 0),
    ]]
    chamfer2_side_3 = [part_1.faces().sort_by_distance(p)[0] for p in [
        (48.54999673, 8.4, 0),
    ]]
    chamfer2 = BRepFilletAPI_MakeChamfer(part_1.part.solid().wrapped)
    for e in chamfer2_edges_1:
        chamfer2.Add(CHAMFER2_SIZE, CHAMFER2_SIZE2, e.wrapped, chamfer2_side_1[0].wrapped)  # the first distance lies on this face
    for e in chamfer2_edges_2:
        chamfer2.Add(CHAMFER2_SIZE, CHAMFER2_SIZE2, e.wrapped, chamfer2_side_2[0].wrapped)  # the first distance lies on this face
    for e in chamfer2_edges_3:
        chamfer2.Add(CHAMFER2_SIZE, CHAMFER2_SIZE2, e.wrapped, chamfer2_side_3[0].wrapped)  # the first distance lies on this face
    add(Compound.cast(chamfer2.Shape()), mode=Mode.REPLACE)

    # Sketch28 → Cut-Extrude18 (cut, through all)
    with BuildSketch(Plane(origin=(0, 3.9, 0), x_dir=(1, 0, 0), z_dir=(0, 1, 0))):
        with Locations((-49.875699162, -0.055329084)):
            Rectangle(SKETCH28_W, SKETCH28_H)
    extrude(amount=CUT_EXTRUDE18_DEPTH, mode=Mode.SUBTRACT)


with BuildPart() as body_2_2:
    # Split1: the piece behind the surface
    add(part_1.part)
    # Split1 surface: a surface, the sketch's curves swept straight by 230.358 mm
    with BuildLine(Plane.XY.offset(12.5).offset(-SPLIT1_SURFACE_1_BACK), mode=Mode.PRIVATE) as split1_surface_1_path:
        Line((49.75, 16.919816136), (44.344439399, 16.919816136))
        Line((44.344439399, 16.919816136), (44.344439399, 5.082242234))
        Line((44.344439399, 5.082242234), (49.75, 5.082242234))
        Line((49.75, 5.082242234), (49.75, 0))
        Line((49.75, 0), (55.284430015, 0))
        Line((55.284430015, 0), (55.284430015, 16.919816136))
        Line((55.284430015, 16.919816136), (49.75, 16.919816136))
    split1_surface_1 = Shell.extrude(split1_surface_1_path.wire(), (0 * SPLIT1_SURFACE_1_DEPTH, 0 * SPLIT1_SURFACE_1_DEPTH, 1 * SPLIT1_SURFACE_1_DEPTH))
    split(bisect_by=split1_surface_1, keep=Keep.BOTTOM)


with BuildPart() as part_2:
    add(part_1.part)

    # Split1: split by a surface, the side it looks to stays
    # Split1 surface: a surface, the sketch's curves swept straight by 230.358 mm
    with BuildLine(Plane.XY.offset(12.5).offset(-SPLIT1_SURFACE_2_BACK), mode=Mode.PRIVATE) as split1_surface_2_path:
        Line((49.75, 16.919816136), (44.344439399, 16.919816136))
        Line((44.344439399, 16.919816136), (44.344439399, 5.082242234))
        Line((44.344439399, 5.082242234), (49.75, 5.082242234))
        Line((49.75, 5.082242234), (49.75, 0))
        Line((49.75, 0), (55.284430015, 0))
        Line((55.284430015, 0), (55.284430015, 16.919816136))
        Line((55.284430015, 16.919816136), (49.75, 16.919816136))
    split1_surface_2 = Shell.extrude(split1_surface_2_path.wire(), (0 * SPLIT1_SURFACE_2_DEPTH, 0 * SPLIT1_SURFACE_2_DEPTH, 1 * SPLIT1_SURFACE_2_DEPTH))
    split(bisect_by=split1_surface_2, keep=Keep.TOP)


solid = Compound([body_2_2.part, part_2.part])
